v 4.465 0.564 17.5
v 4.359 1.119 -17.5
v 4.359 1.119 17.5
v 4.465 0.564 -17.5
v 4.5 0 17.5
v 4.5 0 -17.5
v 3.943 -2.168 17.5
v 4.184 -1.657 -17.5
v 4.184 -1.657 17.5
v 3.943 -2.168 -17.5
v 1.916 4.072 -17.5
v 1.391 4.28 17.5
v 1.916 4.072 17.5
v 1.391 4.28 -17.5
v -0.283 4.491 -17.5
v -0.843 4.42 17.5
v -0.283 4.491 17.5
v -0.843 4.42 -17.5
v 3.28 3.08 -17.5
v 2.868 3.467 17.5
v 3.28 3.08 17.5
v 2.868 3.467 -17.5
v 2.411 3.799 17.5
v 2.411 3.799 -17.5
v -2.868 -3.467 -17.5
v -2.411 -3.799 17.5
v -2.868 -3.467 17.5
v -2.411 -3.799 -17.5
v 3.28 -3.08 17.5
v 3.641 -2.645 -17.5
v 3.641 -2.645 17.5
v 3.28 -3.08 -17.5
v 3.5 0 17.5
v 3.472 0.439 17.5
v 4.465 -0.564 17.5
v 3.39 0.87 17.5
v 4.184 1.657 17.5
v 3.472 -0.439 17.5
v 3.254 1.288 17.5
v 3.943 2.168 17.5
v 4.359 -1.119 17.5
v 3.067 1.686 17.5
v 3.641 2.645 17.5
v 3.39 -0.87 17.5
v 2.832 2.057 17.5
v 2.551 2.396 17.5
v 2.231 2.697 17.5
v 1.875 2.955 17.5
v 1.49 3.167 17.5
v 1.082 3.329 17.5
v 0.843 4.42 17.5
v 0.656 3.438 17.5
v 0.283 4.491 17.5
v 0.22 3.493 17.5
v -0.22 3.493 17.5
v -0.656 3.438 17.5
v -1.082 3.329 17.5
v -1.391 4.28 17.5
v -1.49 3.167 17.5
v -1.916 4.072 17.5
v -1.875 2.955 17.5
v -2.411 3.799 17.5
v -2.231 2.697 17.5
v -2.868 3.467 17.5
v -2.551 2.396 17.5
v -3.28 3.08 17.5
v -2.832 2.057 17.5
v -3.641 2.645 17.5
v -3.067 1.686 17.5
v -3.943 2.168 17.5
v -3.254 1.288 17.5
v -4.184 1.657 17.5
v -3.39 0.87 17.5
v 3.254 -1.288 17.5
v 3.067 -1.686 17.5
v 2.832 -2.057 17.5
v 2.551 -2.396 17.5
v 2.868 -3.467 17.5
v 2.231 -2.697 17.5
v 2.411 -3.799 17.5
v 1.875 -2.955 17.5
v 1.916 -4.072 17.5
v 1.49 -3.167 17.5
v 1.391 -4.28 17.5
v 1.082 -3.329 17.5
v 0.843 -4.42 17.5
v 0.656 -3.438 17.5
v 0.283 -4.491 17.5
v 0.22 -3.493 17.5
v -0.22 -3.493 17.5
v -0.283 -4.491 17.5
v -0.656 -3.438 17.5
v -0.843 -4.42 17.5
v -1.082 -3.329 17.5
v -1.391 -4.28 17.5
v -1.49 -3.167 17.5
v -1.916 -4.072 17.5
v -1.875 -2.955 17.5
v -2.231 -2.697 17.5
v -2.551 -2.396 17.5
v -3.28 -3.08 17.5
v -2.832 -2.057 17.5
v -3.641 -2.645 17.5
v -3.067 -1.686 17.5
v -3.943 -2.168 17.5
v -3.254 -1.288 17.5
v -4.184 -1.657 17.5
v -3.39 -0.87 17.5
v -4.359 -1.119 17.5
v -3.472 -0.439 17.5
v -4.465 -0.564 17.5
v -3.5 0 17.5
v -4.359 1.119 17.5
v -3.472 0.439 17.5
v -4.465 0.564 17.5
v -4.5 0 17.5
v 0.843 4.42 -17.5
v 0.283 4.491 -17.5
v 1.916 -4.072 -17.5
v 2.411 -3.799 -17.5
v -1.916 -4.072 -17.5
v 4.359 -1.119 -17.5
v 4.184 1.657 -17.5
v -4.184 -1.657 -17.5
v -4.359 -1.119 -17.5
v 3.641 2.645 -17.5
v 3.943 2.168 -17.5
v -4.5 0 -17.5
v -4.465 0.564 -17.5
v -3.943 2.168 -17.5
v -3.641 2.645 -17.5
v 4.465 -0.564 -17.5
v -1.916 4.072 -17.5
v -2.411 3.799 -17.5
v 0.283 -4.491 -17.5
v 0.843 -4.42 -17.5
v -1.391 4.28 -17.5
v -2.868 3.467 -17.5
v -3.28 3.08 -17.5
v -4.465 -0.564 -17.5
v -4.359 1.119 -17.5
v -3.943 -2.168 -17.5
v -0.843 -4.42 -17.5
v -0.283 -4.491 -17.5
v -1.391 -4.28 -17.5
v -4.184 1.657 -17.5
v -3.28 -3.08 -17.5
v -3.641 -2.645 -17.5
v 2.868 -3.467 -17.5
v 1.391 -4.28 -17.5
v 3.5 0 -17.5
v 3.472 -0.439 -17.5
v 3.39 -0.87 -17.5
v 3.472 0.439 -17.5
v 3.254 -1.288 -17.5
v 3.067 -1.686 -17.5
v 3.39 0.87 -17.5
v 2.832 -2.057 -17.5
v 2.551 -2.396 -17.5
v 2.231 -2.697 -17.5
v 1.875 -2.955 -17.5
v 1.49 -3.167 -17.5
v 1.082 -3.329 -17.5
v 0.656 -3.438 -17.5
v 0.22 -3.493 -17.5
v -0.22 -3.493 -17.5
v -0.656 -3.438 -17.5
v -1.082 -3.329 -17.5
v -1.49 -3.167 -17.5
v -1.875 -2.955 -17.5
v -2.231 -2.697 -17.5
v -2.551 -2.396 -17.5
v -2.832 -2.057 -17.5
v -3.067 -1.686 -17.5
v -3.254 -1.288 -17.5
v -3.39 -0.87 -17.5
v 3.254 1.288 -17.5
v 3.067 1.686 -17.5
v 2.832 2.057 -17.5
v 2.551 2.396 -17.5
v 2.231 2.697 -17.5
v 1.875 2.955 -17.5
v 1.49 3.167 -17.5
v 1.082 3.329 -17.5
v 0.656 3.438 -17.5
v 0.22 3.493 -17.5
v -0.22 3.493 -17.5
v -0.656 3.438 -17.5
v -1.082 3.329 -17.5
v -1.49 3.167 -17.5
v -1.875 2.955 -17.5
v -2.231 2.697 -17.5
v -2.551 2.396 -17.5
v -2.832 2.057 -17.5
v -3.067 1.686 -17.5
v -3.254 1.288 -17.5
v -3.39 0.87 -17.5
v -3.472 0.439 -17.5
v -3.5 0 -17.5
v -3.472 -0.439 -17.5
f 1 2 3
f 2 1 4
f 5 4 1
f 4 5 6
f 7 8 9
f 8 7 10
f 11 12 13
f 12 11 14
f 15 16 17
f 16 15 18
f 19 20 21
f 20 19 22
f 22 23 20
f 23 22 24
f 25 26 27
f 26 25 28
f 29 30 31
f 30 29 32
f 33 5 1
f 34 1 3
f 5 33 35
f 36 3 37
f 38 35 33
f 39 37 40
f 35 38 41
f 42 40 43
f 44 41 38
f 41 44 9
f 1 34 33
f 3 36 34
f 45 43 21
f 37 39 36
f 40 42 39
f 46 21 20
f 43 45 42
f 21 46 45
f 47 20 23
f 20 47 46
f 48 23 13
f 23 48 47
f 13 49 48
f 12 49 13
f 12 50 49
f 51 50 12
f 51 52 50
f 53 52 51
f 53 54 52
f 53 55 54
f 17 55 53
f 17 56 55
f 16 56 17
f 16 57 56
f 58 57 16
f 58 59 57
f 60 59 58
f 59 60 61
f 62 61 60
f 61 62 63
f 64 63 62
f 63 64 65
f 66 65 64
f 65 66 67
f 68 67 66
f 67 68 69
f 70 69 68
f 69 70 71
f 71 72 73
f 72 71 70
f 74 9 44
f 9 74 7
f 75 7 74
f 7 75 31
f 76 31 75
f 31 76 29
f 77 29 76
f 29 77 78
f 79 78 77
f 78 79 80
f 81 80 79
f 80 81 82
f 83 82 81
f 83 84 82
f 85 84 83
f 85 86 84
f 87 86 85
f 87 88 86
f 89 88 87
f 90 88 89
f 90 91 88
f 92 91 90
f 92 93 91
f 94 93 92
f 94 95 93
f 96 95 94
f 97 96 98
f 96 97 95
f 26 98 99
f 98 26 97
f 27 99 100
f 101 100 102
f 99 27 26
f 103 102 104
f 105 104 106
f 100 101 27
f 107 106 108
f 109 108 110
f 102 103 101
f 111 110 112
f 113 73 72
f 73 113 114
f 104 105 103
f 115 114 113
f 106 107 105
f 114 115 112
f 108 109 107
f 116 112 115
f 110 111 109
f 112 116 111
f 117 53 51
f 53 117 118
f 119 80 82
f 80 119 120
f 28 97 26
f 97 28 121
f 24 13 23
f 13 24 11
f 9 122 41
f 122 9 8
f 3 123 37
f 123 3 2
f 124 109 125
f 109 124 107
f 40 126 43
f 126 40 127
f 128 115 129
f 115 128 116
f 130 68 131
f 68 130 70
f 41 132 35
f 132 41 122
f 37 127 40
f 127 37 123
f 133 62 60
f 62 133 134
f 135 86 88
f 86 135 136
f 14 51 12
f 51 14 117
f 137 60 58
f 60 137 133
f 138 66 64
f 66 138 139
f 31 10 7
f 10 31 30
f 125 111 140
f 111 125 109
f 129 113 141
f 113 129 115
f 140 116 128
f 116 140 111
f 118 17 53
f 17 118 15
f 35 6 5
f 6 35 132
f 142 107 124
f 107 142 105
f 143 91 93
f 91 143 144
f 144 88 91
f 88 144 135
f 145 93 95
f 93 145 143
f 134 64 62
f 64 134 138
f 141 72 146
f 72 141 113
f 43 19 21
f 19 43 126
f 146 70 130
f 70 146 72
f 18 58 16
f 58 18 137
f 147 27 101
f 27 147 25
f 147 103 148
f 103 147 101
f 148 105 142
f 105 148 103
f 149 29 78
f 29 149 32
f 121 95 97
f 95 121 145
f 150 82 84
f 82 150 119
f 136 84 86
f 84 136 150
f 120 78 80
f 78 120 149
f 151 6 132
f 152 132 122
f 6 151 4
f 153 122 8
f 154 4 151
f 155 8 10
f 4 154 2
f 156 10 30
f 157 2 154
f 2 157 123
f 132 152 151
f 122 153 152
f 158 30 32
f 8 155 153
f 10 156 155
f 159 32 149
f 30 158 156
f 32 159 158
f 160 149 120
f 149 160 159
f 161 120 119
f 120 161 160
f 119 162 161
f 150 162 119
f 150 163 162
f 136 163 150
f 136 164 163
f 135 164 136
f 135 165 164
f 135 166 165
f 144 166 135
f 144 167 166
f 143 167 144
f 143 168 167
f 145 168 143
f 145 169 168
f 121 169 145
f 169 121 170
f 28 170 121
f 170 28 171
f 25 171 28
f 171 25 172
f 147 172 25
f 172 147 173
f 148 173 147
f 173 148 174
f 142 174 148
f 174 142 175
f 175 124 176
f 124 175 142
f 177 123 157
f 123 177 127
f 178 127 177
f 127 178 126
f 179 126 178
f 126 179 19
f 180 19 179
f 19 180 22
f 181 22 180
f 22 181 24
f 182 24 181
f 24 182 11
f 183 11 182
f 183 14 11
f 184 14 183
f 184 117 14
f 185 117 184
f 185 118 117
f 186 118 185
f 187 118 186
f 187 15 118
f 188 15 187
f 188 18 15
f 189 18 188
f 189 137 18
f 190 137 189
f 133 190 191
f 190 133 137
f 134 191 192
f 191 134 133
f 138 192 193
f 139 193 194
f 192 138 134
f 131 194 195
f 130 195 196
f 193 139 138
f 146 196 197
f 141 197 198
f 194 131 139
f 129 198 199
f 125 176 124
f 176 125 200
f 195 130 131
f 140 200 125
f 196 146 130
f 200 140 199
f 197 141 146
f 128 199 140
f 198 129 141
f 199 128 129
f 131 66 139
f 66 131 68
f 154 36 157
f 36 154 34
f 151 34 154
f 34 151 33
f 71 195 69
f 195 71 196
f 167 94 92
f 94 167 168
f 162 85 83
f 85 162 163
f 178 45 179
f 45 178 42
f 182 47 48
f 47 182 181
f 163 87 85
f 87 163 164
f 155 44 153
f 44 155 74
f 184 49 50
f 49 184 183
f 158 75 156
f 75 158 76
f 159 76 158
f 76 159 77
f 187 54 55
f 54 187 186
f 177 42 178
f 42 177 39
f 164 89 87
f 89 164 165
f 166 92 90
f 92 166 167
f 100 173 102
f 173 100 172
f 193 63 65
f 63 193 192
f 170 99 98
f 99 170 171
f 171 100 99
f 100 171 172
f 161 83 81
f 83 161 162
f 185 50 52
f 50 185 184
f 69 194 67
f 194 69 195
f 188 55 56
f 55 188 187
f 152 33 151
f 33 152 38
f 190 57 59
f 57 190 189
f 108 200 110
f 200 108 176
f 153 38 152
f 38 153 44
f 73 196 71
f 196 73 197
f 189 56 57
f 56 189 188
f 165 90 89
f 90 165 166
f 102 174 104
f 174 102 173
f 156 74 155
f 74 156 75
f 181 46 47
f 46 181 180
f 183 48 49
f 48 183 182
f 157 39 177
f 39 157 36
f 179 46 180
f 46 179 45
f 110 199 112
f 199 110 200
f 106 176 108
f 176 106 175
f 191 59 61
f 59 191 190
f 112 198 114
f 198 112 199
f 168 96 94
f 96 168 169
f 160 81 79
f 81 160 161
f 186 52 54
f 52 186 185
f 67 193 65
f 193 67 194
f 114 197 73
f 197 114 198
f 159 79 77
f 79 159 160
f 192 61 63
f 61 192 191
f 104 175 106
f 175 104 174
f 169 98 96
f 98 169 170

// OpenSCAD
$fn = 50;


difference() {
	union() {
		translate(v = [0, 0, -17.5000000000]) {
			cylinder(h = 35, r = 4.5000000000);
		}
	}
	union() {
		translate(v = [0, 0, -100.0000000000]) {
			cylinder(h = 200, r = 3.5000000000);
		}
	}
}
